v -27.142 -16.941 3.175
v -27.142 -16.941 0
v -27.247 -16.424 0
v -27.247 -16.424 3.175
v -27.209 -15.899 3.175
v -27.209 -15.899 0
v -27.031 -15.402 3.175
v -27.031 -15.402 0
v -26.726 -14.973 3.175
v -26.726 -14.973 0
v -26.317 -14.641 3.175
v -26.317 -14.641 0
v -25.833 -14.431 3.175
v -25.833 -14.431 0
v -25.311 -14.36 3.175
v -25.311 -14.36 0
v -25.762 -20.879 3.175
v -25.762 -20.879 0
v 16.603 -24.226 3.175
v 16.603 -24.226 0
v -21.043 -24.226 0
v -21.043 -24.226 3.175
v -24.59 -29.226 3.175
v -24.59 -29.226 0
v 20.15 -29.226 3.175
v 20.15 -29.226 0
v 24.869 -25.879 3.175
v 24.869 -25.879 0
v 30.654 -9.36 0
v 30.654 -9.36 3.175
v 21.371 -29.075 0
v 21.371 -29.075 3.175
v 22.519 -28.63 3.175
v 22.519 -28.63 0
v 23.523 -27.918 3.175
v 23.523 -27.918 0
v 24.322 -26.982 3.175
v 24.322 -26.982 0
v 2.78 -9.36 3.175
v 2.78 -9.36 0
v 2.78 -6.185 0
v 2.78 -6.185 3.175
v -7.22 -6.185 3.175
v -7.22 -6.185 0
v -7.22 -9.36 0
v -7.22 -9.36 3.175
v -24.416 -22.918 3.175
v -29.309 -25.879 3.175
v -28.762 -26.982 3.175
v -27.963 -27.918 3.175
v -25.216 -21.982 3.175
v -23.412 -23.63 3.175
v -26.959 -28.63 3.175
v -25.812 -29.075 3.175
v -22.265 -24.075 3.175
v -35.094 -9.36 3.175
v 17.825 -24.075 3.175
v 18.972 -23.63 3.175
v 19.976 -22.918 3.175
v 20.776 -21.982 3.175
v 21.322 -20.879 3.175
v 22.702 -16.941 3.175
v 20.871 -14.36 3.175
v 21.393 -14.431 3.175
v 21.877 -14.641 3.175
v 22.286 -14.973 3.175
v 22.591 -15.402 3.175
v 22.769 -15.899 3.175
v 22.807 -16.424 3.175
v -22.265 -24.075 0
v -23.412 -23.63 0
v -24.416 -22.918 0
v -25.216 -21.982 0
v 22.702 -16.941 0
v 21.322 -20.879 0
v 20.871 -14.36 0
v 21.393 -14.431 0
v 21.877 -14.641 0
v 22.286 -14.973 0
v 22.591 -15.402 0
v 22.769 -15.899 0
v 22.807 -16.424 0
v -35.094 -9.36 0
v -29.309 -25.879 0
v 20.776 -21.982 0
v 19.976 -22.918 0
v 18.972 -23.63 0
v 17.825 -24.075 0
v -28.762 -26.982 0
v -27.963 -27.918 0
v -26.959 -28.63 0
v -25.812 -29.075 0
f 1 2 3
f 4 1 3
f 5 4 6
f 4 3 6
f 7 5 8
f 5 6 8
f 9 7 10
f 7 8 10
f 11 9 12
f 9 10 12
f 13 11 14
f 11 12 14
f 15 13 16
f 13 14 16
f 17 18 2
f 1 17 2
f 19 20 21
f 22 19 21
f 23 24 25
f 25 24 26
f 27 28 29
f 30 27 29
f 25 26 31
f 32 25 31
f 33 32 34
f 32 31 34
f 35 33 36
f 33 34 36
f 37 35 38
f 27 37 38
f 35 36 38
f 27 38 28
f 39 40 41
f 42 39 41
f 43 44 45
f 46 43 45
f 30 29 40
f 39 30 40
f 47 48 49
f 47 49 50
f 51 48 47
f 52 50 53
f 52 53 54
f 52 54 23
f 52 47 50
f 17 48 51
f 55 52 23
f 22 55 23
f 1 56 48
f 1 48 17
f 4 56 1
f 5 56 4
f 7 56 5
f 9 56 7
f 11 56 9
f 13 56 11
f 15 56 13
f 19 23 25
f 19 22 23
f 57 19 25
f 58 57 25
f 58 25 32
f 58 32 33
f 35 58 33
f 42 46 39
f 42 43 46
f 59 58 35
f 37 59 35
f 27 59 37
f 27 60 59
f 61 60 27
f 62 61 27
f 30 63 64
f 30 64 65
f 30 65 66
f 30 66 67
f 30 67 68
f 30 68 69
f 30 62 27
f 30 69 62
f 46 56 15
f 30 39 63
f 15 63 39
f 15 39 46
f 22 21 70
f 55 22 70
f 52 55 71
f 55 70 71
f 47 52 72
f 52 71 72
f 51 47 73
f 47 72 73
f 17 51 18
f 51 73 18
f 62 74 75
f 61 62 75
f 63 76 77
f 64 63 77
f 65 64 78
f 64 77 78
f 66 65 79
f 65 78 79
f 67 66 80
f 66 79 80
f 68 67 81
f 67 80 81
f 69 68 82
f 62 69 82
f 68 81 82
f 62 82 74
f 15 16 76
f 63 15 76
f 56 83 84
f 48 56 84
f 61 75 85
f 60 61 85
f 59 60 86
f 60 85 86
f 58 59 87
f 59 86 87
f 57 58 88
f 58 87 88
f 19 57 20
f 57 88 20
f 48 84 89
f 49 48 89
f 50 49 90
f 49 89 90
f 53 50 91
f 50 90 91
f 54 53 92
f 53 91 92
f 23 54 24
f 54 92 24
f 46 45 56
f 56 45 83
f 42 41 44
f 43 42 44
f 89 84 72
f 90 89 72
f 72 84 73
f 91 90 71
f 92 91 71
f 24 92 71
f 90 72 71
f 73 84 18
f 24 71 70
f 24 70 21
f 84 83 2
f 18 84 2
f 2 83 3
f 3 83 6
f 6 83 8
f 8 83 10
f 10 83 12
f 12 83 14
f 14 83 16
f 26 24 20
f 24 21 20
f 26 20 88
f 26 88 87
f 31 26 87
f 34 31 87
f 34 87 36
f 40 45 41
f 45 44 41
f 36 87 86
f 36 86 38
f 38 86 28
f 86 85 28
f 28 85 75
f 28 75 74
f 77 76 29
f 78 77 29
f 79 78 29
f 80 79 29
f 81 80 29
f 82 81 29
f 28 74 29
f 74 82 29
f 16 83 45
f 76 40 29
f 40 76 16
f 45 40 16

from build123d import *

# Parameters (mm, degrees)
F1_DEPTH = 3.175


with BuildPart() as f1:
    # F0 (on Top) → F1 (new body)
    with BuildSketch(Plane.XY):
        with BuildLine():
            Line((-7.220087, -9.359666), (-35.094466, -9.359666))
            Line((-35.094466, -9.359666), (-29.309166, -25.879119))
            ThreePointArc((-29.309166, -25.879119), (-27.483004, -28.304664), (-24.590185, -29.226478))
            Line((-24.590185, -29.226478), (20.150011, -29.226478))
            ThreePointArc((20.150011, -29.226478), (23.04283, -28.304664), (24.868992, -25.879119))
            Line((24.868992, -25.879119), (30.654292, -9.359666))
            Line((30.654292, -9.359666), (2.779913, -9.359666))
            Line((2.779913, -9.359666), (2.779913, -6.184666))
            Line((2.779913, -6.184666), (-2.220087, -6.184666))
            Line((-2.220087, -6.184666), (-7.220087, -6.184666))
            Line((-7.220087, -6.184666), (-7.220087, -9.359666))
        make_face()
        with BuildLine():
            Line((-7.220087, -14.359667), (2.779913, -14.359667))
            Line((2.779913, -14.359667), (20.870817, -14.359667))
            ThreePointArc((20.870817, -14.359667), (22.452994, -15.177171), (22.701597, -16.940632))
            Line((22.701597, -16.940632), (21.322294, -20.879118))
            ThreePointArc((21.322294, -20.879118), (19.496132, -23.304663), (16.603314, -24.226477))
            Line((16.603314, -24.226477), (-21.043488, -24.226477))
            ThreePointArc((-21.043488, -24.226477), (-23.936306, -23.304663), (-25.762468, -20.879118))
            Line((-25.762468, -20.879118), (-27.141771, -16.940632))
            ThreePointArc((-27.141771, -16.940632), (-26.893168, -15.177171), (-25.310991, -14.359667))
            Line((-25.310991, -14.359667), (-7.220087, -14.359667))
        make_face(mode=Mode.SUBTRACT)
    extrude(amount=F1_DEPTH)


solid = f1.part
